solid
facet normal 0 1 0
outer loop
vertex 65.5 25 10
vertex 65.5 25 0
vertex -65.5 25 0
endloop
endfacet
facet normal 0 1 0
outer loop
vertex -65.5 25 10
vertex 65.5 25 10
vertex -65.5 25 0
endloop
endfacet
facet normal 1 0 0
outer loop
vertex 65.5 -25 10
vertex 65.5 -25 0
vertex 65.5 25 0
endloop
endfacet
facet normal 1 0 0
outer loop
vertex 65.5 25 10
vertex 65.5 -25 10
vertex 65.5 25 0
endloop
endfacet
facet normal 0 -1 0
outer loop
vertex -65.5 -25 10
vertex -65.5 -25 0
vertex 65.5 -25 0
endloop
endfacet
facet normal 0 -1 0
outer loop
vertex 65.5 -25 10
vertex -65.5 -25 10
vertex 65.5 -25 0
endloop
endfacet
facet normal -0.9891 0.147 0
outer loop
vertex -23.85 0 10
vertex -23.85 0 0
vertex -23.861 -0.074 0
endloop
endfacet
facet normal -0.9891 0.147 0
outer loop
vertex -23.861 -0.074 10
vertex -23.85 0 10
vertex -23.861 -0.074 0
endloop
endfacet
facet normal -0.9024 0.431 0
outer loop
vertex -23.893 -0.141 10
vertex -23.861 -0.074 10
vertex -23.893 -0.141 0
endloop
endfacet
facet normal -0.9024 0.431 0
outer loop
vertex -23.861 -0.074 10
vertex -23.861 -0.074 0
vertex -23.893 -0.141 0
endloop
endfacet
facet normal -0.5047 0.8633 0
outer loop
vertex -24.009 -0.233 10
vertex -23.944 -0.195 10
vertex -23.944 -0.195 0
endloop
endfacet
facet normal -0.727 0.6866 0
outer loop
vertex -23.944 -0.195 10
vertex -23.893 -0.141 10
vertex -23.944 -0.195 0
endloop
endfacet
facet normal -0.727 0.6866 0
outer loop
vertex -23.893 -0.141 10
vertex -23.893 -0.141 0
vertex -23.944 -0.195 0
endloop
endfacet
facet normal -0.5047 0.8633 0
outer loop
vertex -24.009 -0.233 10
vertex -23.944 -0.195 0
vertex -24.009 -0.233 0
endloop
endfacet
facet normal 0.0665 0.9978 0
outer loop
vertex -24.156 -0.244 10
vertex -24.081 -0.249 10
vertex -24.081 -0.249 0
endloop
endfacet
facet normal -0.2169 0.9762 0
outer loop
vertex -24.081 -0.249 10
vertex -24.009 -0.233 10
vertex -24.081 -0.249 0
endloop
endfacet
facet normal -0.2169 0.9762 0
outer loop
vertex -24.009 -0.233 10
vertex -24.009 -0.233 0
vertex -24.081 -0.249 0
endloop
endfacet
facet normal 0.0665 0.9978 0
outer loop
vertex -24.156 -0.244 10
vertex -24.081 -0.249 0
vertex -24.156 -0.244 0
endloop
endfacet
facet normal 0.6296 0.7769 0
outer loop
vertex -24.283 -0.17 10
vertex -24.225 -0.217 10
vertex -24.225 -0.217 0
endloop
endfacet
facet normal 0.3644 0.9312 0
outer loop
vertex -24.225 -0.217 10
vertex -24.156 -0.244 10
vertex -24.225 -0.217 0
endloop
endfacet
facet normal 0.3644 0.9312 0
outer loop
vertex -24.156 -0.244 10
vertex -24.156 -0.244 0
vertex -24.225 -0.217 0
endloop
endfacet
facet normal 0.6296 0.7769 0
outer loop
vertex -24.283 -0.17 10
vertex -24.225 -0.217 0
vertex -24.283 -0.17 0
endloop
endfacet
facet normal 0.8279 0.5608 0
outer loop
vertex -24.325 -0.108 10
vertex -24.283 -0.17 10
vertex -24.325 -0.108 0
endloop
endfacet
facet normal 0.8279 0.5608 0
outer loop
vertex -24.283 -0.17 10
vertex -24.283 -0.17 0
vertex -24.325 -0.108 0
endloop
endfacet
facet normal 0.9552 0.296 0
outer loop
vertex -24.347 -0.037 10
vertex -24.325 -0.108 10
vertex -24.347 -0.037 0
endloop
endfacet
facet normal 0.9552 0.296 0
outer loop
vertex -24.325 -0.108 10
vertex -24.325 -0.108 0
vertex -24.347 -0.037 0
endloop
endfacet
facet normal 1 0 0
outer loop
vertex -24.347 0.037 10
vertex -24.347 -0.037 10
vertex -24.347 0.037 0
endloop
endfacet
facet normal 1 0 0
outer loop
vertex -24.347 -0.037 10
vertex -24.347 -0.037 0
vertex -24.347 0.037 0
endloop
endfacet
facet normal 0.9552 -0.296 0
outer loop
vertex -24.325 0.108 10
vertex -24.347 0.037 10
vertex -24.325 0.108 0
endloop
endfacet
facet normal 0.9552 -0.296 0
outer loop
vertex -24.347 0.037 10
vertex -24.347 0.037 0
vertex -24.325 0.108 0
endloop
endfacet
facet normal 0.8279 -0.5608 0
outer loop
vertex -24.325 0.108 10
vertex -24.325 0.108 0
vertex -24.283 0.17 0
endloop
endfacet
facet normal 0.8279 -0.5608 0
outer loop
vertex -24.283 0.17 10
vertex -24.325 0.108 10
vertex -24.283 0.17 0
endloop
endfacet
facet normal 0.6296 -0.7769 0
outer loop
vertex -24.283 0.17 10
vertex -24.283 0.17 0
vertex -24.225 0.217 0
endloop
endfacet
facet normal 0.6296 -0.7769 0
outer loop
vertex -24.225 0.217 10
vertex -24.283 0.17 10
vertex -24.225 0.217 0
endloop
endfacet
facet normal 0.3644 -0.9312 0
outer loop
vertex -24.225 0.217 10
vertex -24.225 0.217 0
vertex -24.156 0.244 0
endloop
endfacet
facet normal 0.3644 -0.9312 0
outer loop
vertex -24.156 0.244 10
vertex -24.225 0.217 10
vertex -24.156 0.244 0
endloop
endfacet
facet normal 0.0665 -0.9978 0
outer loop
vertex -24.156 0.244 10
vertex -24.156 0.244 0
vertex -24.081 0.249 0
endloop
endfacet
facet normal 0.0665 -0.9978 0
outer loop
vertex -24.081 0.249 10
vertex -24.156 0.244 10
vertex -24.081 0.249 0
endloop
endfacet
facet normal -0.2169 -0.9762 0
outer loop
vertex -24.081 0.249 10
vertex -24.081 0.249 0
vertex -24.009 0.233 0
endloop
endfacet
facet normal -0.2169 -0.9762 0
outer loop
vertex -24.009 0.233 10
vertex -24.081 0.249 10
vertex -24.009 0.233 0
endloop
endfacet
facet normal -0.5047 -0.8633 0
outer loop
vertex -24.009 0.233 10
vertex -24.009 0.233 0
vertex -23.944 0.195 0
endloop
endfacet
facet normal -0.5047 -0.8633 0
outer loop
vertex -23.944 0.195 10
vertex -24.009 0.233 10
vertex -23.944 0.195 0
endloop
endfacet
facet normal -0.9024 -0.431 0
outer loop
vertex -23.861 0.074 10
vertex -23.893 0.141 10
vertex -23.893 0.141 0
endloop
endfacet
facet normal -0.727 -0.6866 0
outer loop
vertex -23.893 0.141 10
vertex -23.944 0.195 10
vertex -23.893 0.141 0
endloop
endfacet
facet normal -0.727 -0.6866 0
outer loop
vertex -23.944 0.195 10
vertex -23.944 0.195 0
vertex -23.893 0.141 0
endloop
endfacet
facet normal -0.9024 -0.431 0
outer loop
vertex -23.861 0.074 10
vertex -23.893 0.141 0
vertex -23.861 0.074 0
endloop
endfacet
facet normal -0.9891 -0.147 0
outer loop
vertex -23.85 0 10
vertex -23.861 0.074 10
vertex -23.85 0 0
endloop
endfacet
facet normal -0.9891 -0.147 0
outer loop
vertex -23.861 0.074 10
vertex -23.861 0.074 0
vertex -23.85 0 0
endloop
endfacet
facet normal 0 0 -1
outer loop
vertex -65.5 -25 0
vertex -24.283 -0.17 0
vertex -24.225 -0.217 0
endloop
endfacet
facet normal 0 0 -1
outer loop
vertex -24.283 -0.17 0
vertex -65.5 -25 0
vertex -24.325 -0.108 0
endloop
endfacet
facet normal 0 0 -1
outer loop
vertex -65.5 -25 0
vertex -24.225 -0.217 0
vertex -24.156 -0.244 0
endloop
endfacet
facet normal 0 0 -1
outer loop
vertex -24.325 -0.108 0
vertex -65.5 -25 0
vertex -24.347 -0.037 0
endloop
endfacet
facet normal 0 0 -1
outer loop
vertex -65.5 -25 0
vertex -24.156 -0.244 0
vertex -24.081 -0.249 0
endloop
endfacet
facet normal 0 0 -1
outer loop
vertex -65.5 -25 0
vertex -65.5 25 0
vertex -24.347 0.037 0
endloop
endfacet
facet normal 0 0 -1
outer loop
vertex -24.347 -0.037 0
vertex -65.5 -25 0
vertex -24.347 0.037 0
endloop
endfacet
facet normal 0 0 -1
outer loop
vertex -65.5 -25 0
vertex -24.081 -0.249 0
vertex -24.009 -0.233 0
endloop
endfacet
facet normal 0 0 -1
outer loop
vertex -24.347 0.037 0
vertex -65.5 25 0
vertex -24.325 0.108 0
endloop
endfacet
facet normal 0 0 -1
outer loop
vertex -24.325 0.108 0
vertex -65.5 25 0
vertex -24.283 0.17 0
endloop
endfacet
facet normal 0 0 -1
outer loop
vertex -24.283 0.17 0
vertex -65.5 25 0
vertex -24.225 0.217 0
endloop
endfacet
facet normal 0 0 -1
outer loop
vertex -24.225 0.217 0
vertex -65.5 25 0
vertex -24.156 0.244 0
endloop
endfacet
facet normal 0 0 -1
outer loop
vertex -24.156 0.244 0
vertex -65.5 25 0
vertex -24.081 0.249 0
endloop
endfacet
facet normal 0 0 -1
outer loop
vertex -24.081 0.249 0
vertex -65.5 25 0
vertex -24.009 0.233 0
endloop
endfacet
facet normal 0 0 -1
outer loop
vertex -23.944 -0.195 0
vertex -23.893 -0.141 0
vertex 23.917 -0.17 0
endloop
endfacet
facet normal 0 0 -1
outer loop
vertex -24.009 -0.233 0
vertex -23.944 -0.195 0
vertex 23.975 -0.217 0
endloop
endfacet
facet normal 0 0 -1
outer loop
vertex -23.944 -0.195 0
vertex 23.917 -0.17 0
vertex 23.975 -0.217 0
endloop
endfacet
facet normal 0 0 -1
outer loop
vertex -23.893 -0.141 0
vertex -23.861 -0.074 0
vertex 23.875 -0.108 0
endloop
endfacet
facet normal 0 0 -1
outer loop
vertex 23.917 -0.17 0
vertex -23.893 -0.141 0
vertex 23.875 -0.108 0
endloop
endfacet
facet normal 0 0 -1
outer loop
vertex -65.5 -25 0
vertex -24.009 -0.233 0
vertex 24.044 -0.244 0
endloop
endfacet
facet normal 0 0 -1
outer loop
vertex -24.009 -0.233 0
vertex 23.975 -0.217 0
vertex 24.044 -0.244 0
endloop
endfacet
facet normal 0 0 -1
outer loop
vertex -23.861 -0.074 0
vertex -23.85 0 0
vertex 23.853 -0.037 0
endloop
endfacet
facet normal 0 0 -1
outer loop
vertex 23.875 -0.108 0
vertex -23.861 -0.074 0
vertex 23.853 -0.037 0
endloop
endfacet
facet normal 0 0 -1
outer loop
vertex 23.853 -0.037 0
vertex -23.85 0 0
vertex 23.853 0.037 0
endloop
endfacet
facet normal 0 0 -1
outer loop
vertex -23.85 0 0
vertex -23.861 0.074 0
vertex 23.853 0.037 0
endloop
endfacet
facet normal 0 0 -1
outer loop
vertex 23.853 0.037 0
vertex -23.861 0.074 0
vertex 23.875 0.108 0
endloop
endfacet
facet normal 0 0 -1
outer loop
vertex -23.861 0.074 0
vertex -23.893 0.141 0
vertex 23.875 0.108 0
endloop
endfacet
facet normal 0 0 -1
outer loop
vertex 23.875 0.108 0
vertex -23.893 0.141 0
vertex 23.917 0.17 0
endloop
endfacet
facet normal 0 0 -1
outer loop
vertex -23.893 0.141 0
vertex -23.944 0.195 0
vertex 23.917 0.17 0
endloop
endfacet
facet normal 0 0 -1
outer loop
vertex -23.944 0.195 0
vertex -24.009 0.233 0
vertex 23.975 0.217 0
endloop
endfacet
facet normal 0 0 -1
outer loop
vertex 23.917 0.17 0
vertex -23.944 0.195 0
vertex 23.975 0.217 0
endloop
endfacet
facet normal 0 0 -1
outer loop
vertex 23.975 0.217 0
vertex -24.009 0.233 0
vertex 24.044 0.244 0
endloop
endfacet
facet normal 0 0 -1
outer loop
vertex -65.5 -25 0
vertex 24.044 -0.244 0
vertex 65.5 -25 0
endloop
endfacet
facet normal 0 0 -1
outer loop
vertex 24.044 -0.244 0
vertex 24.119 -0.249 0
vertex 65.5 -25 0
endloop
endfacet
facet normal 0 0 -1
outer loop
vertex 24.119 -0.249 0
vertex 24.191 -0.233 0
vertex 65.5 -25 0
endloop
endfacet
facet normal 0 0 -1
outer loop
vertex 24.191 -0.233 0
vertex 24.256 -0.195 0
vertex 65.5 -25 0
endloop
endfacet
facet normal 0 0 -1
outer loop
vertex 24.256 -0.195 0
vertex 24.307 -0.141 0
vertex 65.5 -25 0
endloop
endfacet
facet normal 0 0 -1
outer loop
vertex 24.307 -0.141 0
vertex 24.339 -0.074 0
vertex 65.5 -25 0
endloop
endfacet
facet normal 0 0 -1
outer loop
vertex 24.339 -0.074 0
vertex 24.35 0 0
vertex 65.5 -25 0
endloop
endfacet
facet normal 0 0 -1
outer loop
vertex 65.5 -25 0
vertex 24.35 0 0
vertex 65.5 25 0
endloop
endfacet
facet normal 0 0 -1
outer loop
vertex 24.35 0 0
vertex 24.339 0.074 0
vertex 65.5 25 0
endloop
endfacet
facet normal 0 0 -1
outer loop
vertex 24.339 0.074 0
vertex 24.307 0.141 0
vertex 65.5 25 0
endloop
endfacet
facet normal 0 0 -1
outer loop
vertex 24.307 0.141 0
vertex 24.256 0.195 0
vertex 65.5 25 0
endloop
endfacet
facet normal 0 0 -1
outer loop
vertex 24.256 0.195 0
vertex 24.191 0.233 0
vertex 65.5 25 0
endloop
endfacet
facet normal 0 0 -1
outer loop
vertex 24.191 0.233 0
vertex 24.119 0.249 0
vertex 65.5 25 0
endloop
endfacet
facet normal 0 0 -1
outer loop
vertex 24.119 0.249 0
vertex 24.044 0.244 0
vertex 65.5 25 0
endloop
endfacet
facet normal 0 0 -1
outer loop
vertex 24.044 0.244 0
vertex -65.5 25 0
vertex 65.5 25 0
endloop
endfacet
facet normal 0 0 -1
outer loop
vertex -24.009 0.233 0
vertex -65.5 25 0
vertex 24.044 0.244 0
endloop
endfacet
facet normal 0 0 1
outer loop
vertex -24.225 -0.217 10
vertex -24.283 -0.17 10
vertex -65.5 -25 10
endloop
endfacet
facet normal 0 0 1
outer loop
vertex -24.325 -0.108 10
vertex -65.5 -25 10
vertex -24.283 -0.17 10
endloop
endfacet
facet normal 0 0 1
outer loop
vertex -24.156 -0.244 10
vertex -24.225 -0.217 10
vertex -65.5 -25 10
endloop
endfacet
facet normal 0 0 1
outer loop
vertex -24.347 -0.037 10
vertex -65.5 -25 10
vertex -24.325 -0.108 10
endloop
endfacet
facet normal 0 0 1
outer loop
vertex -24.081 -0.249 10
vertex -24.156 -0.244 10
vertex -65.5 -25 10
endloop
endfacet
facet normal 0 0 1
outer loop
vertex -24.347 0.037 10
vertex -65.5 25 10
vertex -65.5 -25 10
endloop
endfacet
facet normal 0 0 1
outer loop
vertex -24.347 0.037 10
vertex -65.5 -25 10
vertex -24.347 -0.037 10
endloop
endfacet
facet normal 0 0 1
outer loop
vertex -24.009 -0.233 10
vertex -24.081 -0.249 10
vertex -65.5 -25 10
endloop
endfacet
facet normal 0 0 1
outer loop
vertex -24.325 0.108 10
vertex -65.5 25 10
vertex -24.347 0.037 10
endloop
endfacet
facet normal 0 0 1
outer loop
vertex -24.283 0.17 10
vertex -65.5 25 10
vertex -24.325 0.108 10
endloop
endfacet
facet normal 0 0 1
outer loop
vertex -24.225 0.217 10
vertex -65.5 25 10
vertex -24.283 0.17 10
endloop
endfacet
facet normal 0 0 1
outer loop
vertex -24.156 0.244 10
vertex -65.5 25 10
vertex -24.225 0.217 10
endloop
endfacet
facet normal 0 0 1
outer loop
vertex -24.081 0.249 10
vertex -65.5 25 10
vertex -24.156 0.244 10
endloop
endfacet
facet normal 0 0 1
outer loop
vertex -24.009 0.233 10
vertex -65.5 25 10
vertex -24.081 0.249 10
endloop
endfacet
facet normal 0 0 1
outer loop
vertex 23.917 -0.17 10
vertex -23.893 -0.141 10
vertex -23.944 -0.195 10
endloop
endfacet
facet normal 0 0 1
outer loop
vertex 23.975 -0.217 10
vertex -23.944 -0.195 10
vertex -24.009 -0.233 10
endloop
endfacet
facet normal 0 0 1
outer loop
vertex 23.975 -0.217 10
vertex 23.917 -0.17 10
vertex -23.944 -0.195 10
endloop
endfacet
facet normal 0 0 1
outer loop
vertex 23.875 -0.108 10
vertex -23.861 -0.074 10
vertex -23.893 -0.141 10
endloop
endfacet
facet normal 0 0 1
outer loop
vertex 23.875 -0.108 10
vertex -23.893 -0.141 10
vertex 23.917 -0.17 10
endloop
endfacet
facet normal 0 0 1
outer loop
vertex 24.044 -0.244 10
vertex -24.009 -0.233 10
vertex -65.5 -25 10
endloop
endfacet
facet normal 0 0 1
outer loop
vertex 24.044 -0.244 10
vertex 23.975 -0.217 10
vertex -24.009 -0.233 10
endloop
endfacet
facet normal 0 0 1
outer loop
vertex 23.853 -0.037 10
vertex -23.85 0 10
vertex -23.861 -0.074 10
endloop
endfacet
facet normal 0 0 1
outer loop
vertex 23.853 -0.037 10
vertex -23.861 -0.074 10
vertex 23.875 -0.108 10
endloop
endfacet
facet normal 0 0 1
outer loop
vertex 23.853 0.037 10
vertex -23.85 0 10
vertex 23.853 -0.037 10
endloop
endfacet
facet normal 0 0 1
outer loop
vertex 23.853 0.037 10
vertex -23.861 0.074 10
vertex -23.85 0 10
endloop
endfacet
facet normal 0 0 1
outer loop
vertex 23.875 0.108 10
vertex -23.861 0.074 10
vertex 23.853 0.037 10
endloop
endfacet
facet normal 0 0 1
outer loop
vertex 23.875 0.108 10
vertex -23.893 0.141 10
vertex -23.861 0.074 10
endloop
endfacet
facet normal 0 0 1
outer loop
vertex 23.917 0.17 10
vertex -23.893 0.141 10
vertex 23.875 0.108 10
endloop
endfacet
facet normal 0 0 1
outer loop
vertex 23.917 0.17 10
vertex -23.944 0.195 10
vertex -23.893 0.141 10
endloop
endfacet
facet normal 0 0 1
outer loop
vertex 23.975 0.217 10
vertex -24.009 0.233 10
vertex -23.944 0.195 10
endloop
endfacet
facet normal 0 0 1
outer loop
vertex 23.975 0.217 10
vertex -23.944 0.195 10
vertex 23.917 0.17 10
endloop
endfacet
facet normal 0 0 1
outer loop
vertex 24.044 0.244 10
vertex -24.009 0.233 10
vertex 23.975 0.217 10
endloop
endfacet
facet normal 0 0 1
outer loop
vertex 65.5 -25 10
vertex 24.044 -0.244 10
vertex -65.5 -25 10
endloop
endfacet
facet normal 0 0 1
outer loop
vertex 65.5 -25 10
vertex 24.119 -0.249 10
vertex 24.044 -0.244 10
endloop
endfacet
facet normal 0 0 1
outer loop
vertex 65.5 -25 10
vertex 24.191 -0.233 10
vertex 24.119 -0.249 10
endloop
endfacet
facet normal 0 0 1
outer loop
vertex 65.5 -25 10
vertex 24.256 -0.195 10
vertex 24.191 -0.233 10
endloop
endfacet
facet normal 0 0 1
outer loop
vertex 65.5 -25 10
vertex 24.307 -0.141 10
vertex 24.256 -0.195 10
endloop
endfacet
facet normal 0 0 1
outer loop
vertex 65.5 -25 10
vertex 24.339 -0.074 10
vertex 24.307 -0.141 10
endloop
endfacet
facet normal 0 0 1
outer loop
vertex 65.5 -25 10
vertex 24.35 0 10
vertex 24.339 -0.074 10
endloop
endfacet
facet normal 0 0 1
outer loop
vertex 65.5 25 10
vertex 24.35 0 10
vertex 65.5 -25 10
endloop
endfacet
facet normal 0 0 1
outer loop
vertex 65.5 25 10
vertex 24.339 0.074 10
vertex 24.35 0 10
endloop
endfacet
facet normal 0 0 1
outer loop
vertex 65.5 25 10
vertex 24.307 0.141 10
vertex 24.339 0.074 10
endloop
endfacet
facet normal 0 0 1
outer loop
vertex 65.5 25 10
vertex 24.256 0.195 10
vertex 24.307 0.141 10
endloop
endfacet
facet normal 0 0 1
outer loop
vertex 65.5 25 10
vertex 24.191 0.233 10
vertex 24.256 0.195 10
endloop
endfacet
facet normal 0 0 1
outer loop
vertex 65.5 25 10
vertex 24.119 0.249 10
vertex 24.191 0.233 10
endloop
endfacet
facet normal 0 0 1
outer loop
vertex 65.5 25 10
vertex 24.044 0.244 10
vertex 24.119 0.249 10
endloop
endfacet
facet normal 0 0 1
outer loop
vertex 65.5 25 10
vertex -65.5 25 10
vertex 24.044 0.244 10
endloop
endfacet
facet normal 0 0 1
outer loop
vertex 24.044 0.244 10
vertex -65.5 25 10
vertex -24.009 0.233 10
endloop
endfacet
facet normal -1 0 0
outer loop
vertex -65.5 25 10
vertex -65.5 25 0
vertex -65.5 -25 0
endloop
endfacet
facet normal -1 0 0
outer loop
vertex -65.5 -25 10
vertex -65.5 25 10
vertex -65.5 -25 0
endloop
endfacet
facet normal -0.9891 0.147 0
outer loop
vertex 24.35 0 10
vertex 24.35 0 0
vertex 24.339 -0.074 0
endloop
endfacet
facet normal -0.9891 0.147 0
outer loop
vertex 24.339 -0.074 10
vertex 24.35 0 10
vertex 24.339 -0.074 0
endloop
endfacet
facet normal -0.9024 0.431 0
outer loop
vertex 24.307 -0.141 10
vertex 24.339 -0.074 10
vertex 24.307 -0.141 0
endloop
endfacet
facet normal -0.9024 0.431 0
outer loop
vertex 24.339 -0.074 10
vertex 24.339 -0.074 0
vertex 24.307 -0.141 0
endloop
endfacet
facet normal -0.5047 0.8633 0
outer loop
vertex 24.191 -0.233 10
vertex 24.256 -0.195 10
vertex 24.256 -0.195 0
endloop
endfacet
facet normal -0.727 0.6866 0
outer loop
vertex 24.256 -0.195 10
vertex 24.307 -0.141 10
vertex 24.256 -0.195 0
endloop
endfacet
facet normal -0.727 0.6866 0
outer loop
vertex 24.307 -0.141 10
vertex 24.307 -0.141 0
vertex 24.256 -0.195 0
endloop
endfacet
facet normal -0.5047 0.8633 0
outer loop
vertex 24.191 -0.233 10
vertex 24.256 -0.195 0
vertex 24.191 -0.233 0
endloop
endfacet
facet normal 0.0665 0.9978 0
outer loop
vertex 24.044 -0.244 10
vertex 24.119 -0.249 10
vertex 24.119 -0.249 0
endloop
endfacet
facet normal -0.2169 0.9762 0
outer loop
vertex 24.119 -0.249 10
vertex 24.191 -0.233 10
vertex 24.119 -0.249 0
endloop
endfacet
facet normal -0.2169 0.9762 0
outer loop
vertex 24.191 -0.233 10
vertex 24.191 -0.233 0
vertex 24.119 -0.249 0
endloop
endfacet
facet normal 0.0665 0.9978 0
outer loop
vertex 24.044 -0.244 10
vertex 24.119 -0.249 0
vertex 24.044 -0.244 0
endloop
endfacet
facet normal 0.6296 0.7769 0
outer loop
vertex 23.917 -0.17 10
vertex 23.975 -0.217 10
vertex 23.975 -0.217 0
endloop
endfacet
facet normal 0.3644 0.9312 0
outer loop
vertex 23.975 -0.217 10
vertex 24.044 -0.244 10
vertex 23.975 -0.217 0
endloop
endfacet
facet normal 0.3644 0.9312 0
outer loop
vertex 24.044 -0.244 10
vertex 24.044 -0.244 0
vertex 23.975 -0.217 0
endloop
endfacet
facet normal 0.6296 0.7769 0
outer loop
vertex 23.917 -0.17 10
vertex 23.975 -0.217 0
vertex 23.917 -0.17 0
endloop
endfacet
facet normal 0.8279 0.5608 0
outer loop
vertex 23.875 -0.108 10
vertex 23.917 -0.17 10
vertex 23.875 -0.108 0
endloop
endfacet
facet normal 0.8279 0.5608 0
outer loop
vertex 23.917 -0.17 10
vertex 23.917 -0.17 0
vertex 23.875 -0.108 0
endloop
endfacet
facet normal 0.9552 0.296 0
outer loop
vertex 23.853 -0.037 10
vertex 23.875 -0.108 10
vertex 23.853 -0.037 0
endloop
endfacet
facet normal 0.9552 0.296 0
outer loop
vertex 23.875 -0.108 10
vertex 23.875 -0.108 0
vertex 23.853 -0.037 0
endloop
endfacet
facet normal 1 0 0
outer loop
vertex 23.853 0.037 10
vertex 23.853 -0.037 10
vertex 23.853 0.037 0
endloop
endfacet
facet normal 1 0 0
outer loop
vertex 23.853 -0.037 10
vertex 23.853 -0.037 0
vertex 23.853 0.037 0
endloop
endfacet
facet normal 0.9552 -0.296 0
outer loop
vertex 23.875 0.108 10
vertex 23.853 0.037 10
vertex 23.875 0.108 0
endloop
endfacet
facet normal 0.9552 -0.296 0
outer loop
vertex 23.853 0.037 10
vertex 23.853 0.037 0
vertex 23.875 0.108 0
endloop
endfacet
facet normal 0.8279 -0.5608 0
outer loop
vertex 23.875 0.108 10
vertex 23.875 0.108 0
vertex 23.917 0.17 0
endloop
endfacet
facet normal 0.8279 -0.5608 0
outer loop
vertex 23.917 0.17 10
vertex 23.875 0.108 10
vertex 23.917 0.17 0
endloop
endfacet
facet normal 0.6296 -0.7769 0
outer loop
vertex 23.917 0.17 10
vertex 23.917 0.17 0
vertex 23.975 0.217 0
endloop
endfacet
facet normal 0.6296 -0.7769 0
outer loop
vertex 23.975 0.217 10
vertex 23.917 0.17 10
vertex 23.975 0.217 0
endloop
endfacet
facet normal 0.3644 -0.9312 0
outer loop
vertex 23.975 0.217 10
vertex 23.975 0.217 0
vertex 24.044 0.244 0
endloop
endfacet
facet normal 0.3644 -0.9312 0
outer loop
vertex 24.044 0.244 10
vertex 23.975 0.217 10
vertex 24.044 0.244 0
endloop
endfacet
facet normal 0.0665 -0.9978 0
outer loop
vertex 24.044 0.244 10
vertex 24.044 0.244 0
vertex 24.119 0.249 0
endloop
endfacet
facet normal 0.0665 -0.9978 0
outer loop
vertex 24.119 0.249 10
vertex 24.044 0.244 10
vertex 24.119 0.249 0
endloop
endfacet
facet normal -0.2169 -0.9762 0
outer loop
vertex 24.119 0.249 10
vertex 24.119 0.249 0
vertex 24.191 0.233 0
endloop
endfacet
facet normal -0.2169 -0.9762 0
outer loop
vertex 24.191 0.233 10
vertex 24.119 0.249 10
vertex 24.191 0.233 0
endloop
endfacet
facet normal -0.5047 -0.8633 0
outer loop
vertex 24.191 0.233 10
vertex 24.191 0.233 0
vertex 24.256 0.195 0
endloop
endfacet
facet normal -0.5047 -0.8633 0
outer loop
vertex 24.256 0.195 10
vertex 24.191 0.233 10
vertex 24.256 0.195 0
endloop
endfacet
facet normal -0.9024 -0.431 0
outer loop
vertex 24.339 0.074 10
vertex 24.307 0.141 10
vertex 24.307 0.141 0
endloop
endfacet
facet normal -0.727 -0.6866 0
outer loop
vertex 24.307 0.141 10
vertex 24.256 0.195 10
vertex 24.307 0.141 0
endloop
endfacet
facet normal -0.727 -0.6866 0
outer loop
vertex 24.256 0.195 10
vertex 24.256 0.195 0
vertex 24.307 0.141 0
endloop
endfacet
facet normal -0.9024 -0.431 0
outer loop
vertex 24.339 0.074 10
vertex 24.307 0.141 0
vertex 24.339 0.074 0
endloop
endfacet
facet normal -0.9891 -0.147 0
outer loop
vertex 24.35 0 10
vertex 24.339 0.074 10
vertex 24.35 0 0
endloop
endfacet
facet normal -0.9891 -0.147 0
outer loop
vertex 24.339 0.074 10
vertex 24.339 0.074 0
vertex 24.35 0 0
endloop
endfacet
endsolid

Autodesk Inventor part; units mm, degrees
ref_plane "YZ Plane" through (0, 0, 0) normal (1, 0, 0) x (0, 1, 0)
ref_plane "XZ Plane" through (0, 0, 0) normal (0, 1, 0) x (-1, 0, 0)
ref_plane "XY Plane" through (0, 0, 0) normal (0, 0, 1) x (1, 0, 0)
sketch "Sketch1" plane through (0, 0, 0) normal (0, 0, 1) x (1, 0, 0)
  line L0 (65.5, 25) -> (-65.5, 25)
  line L1 (-65.5, 25) -> (-65.5, -25)
  line L2 (-65.5, -25) -> (65.5, -25)
  line L3 (65.5, -25) -> (65.5, 25)
  circle A0 centre (-24.1, 0) radius 0.25
  circle A1 centre (24.1, 0) radius 0.25
  dimension "d0" = 131
  dimension "d1" = 50
  dimension "d4" = 0.5
  dimension "d5" = 0.5
extrude "Extrusion1" add sketch "Sketch1" along normal blind 10
properties part number "prepazka_bez_loziska-sablona"
